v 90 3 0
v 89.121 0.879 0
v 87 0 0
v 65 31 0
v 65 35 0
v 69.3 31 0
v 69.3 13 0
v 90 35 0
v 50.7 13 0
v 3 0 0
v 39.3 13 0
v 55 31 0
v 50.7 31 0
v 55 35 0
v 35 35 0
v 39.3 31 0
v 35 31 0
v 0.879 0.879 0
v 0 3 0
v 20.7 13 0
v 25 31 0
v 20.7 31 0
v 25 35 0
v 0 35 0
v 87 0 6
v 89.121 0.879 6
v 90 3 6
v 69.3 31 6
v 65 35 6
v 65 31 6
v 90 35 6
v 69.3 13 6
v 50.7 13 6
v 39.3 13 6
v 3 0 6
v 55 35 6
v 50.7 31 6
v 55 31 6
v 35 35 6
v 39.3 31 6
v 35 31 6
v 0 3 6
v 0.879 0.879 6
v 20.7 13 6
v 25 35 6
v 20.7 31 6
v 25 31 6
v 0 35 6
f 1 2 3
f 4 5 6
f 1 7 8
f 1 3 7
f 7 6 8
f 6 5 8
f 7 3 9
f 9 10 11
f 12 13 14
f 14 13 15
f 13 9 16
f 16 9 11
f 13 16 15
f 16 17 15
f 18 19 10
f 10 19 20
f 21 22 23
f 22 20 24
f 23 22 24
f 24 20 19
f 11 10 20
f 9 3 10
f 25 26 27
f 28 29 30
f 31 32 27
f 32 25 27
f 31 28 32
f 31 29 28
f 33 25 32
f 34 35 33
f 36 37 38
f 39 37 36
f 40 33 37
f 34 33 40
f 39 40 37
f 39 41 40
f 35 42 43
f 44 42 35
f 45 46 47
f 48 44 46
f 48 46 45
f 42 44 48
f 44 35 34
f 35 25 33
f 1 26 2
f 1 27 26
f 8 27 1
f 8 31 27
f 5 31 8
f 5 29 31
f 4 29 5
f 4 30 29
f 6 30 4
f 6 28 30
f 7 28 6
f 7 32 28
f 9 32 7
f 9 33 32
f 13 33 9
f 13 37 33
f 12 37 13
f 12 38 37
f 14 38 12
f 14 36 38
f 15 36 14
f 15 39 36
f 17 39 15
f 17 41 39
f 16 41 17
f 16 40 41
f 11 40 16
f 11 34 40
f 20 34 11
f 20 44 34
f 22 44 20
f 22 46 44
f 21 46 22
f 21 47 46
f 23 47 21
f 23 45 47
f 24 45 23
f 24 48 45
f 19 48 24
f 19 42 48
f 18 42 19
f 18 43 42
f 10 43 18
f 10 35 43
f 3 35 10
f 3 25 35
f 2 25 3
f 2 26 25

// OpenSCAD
$fn = 32;

// ----------------------------------------------------------------------
// Window plate: 90 x 35 mm, 2 open windows
// ----------------------------------------------------------------------

// --- parameters (mm) ---
profile_height = 6;       // extrusion height
profile_points = 24;      // points of the closed outline

profile = [[0, 3], [0.879, 0.879], [3, 0], [87, 0], [89.121, 0.879], [90, 3], [90, 35], [65, 35], [65, 31], [69.3, 31], [69.3, 13], [50.7, 13], [50.7, 31], [55, 31], [55, 35], [35, 35], [35, 31], [39.3, 31], [39.3, 13], [20.7, 13], [20.7, 31], [25, 31], [25, 35], [0, 35]];  // single closed polygon, 24 points, counter clockwise

// --- the one profile operation ---
linear_extrude(height = profile_height) polygon(points = profile);
